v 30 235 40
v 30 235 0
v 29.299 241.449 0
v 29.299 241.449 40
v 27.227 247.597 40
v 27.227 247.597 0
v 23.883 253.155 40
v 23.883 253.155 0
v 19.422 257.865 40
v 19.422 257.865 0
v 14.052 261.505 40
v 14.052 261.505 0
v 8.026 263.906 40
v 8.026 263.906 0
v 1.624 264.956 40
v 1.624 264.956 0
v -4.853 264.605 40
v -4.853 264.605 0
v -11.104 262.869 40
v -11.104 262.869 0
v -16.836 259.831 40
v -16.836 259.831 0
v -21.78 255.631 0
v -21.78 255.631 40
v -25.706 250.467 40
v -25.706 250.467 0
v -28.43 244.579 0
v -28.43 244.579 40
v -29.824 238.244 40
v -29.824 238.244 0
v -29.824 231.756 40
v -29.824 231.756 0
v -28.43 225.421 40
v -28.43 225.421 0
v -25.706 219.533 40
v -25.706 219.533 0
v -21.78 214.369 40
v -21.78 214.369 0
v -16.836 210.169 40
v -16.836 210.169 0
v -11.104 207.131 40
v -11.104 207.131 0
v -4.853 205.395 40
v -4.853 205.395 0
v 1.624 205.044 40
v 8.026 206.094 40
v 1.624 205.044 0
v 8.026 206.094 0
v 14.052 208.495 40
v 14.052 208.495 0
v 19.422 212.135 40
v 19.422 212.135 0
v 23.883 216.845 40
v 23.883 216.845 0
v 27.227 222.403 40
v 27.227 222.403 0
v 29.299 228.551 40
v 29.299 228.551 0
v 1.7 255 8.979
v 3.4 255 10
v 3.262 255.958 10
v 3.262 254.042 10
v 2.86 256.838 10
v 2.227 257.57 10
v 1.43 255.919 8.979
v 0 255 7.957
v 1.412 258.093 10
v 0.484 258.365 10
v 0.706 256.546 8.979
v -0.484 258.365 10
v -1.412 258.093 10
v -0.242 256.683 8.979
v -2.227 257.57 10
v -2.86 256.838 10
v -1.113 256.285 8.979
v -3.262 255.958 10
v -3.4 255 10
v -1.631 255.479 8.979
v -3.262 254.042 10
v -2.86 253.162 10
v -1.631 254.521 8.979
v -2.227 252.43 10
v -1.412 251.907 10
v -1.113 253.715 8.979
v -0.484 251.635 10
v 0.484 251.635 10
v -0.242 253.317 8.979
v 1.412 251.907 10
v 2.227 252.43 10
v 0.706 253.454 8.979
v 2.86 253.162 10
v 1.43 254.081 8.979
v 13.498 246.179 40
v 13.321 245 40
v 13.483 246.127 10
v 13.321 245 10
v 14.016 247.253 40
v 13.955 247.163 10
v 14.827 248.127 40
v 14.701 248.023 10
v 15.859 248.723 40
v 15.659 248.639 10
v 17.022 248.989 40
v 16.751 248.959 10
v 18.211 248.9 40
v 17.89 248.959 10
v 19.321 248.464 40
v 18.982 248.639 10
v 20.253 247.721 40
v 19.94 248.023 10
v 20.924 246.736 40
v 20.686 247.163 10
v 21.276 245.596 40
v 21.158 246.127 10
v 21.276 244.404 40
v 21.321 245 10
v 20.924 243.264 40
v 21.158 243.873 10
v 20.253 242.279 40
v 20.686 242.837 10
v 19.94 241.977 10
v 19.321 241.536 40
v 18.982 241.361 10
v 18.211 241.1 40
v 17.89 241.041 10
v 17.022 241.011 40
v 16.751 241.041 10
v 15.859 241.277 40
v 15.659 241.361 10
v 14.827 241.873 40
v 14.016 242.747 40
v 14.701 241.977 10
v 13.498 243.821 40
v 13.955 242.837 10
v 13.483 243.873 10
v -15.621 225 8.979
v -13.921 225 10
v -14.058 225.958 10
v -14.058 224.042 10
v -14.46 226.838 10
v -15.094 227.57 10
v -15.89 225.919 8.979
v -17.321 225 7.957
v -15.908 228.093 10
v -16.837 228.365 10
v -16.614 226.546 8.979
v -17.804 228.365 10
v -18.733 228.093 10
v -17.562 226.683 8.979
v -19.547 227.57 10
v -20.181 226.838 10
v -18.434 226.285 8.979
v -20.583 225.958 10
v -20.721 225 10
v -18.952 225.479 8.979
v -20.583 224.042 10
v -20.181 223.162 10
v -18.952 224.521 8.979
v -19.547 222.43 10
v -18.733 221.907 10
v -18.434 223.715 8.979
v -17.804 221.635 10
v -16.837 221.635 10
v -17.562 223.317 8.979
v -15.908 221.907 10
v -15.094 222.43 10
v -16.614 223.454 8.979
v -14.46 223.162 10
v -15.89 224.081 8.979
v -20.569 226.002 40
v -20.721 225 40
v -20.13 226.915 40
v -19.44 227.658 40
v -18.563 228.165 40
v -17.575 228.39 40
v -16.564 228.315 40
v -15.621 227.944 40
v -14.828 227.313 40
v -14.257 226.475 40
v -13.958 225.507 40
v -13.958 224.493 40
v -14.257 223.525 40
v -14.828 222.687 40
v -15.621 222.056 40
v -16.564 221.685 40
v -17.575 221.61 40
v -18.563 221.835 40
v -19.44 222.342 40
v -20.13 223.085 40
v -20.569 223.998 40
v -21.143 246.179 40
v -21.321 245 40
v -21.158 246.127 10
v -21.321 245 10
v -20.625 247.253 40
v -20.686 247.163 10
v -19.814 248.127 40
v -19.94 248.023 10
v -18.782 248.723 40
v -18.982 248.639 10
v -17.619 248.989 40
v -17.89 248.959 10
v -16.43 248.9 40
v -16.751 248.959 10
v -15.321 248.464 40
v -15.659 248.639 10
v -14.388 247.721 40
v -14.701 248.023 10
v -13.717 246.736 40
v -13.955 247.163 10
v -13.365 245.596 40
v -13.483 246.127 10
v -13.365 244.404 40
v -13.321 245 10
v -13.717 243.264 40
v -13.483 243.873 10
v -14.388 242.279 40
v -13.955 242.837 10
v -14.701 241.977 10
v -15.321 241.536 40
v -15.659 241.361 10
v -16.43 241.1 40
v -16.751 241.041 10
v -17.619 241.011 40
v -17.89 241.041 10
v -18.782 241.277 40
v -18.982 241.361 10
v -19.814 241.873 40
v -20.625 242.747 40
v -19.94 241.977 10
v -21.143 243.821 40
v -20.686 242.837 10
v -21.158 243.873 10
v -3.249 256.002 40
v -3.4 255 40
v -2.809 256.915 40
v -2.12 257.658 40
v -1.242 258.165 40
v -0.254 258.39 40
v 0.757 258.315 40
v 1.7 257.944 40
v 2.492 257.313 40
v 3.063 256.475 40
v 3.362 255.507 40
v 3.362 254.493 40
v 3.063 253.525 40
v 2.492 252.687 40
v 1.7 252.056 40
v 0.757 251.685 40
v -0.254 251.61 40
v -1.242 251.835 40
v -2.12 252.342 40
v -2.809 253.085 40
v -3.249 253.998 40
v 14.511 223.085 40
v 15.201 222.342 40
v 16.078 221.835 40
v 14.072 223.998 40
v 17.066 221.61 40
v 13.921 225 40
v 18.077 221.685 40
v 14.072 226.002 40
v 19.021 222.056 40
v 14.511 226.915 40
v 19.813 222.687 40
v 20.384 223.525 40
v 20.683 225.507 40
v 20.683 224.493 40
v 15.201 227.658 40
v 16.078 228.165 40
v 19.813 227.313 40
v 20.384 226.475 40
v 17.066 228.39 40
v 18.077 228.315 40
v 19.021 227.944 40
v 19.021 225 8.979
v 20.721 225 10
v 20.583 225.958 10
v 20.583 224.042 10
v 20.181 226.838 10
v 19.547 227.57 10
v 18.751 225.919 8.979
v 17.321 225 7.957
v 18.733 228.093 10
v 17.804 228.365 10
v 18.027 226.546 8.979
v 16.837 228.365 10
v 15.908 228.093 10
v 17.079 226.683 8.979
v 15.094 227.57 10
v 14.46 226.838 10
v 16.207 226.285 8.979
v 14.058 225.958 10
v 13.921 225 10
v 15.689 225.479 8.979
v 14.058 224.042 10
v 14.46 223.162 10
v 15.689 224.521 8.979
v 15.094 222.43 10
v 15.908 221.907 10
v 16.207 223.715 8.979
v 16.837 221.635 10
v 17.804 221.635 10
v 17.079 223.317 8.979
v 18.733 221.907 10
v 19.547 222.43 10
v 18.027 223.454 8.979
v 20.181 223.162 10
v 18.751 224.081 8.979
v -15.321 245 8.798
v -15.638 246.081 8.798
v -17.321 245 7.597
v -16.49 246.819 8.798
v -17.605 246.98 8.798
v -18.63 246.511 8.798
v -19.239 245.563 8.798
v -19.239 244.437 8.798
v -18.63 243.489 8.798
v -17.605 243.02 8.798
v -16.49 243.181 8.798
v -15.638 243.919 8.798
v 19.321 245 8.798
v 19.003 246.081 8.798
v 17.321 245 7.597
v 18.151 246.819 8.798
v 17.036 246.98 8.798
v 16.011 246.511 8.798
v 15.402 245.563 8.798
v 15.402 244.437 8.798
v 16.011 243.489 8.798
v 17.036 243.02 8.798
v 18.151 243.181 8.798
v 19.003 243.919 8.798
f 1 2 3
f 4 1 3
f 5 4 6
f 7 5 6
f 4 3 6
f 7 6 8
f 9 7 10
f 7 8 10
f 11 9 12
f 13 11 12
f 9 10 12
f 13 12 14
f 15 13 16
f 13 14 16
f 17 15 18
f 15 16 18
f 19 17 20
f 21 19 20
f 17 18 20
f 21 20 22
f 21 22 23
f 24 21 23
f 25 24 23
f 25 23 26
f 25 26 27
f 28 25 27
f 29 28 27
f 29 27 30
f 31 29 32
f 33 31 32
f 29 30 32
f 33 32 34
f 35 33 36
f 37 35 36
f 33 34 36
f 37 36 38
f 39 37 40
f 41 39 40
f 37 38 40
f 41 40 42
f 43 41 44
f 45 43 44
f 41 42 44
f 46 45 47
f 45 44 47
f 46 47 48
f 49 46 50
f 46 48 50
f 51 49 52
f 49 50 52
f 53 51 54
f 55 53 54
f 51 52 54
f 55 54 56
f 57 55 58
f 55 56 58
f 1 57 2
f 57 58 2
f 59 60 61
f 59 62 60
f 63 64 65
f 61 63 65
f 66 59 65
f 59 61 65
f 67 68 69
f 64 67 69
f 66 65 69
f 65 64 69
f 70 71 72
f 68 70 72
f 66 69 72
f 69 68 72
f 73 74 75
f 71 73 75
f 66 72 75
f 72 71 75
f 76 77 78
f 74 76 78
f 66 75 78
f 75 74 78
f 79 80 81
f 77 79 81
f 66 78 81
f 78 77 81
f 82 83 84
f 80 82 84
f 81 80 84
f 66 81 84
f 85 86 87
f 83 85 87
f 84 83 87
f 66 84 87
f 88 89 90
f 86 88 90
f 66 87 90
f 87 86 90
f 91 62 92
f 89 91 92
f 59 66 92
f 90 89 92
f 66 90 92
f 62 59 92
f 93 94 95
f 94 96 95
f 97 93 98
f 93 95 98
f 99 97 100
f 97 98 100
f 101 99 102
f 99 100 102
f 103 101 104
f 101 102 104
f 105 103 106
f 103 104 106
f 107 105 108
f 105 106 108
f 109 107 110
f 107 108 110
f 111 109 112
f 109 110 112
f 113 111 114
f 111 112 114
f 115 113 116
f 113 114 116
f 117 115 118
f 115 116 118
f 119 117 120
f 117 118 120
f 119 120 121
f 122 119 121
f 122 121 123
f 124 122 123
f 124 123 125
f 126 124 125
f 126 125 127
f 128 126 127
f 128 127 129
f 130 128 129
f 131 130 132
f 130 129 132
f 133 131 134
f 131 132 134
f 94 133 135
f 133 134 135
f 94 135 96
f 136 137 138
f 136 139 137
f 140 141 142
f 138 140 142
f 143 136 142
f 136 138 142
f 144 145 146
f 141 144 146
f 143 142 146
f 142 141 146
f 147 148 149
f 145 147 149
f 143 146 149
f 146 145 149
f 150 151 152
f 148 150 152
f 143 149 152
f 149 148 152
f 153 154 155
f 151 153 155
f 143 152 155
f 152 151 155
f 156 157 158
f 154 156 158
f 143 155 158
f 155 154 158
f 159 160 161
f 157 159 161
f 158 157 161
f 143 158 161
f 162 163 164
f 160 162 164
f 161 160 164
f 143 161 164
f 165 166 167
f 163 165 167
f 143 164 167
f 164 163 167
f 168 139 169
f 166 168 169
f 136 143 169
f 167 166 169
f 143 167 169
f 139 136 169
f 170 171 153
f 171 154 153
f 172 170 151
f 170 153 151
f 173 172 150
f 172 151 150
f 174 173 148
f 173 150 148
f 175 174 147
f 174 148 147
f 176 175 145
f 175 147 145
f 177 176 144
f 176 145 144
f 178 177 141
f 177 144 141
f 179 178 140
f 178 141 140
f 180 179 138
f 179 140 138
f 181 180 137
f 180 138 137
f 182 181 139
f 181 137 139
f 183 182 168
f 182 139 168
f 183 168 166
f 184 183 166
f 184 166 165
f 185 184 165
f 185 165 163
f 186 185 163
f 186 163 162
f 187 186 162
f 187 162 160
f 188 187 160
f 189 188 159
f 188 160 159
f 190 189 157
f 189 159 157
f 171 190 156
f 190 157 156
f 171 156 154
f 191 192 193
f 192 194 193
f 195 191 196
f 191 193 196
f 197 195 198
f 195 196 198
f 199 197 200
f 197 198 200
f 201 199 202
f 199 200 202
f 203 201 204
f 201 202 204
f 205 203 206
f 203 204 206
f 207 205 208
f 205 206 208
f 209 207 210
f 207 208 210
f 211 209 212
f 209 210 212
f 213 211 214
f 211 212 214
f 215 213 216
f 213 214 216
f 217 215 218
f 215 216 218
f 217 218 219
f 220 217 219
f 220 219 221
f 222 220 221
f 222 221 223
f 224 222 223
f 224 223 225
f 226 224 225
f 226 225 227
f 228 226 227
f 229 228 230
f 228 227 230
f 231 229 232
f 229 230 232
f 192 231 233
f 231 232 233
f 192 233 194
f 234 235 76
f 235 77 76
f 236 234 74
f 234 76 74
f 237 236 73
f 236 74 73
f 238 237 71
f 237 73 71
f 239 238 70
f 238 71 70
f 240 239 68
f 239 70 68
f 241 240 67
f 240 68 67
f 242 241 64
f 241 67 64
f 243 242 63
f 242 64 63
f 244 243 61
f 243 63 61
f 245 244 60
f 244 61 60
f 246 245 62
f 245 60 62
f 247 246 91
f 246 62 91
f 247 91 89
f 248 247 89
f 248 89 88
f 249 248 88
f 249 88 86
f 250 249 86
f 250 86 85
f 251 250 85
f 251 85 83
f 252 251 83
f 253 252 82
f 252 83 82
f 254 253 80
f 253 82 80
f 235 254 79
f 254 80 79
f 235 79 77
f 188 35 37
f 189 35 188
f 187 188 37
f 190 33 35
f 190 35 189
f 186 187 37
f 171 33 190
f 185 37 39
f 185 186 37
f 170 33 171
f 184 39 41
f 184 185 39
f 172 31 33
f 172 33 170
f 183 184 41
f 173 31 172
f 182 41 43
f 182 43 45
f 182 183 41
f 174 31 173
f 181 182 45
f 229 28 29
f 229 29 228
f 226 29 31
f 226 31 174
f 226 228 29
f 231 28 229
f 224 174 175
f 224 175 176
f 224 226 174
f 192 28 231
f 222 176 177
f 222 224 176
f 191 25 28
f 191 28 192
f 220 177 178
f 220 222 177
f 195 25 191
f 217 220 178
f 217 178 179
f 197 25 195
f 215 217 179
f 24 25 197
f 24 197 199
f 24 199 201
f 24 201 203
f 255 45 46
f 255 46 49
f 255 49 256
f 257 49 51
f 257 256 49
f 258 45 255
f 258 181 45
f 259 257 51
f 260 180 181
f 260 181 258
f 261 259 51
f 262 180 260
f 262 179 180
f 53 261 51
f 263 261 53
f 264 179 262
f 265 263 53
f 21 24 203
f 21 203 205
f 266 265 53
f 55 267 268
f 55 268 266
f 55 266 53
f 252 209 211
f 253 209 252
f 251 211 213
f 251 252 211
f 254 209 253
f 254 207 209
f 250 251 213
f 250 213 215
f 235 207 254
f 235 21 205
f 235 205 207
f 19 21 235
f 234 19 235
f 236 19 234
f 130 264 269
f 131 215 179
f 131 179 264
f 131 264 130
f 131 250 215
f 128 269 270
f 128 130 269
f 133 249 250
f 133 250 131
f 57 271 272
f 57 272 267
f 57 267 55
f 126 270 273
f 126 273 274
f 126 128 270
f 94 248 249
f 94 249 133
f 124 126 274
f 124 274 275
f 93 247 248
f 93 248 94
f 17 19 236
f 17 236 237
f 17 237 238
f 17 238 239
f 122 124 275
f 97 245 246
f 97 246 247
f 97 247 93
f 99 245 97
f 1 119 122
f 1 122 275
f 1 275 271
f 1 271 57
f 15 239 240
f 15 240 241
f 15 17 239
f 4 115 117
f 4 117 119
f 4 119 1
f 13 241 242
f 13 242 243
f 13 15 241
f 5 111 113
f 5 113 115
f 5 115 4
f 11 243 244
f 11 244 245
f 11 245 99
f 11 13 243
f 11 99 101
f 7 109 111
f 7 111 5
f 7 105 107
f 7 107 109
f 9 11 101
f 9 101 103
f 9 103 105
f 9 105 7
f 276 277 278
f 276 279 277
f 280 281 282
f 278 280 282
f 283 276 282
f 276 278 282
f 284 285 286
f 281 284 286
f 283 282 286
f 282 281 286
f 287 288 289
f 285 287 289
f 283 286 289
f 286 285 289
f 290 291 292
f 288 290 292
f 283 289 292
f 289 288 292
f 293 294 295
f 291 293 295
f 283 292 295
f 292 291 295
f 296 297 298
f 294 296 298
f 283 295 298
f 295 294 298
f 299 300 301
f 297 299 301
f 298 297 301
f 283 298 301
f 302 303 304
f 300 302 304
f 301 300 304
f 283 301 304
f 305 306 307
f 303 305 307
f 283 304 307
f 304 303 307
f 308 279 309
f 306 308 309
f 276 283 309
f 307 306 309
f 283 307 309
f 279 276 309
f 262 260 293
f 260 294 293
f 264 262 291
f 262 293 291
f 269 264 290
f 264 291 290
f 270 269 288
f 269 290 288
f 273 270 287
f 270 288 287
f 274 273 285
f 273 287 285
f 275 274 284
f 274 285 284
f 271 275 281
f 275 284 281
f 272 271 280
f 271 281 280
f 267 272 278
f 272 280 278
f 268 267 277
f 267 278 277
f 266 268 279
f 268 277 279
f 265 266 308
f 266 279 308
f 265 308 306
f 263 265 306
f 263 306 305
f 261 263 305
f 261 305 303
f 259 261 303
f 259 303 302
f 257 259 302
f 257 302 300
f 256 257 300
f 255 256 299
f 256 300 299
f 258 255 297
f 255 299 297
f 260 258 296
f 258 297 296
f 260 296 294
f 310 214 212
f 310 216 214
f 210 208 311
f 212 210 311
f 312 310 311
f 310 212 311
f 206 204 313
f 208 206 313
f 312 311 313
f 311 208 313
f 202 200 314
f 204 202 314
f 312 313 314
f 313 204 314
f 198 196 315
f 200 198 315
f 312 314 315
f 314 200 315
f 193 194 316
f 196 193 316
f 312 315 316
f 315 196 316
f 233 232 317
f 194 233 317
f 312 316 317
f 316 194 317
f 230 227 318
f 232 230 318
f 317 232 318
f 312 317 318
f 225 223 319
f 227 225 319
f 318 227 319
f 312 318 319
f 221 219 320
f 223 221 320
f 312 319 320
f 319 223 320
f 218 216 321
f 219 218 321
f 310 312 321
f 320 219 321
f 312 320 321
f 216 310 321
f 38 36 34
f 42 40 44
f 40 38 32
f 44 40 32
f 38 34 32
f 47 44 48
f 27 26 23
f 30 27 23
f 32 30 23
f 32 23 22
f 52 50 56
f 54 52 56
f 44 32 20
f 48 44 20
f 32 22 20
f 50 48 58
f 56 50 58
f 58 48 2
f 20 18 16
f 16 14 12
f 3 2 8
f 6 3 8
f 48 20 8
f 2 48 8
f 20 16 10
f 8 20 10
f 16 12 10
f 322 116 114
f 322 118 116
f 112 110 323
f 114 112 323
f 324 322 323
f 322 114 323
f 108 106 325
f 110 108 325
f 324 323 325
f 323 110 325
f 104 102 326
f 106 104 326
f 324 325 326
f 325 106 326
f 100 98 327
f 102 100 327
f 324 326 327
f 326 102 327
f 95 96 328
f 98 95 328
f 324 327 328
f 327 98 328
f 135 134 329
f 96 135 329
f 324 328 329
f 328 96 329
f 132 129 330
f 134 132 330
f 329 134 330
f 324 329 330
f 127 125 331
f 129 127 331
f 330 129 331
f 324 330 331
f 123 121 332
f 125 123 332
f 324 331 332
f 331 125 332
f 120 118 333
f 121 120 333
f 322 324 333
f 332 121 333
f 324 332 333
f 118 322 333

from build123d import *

# Parameters (mm, degrees)
ESBO_O1_R                   = 30
RESSALTO_EXTRUS_O1_DEPTH    = 40
FURO_ROSCADO_DE_M81_D       = 6.8
FURO_ROSCADO_DE_M81_DEPTH   = 30
FURO_ROSCADO_DE_M81_TIP     = 2.042926105
FUROS_GUIA_COM_8_0MM1_D     = 8
FUROS_GUIA_COM_8_0MM1_DEPTH = 30
FUROS_GUIA_COM_8_0MM1_TIP   = 2.403442476


with BuildPart() as part:
    # Esboço1 → Ressalto-extrusão1 (new body)
    with BuildSketch(Plane.XY):
        with Locations((0, 235)):
            Circle(ESBO_O1_R)
    extrude(amount=RESSALTO_EXTRUS_O1_DEPTH)

    # Furo roscado de M81
    with Locations(Plane.XY.offset(40)):
        with Locations((-17.320508076, 225), (0, 255), (17.320508076, 225)):
            Hole(FURO_ROSCADO_DE_M81_D / 2, depth=FURO_ROSCADO_DE_M81_DEPTH)
            with Locations((0, 0, -(FURO_ROSCADO_DE_M81_DEPTH + FURO_ROSCADO_DE_M81_TIP / 2))):  # 118° drill point
                Cone(0, FURO_ROSCADO_DE_M81_D / 2, FURO_ROSCADO_DE_M81_TIP, mode=Mode.SUBTRACT)

    # Furos-guia com Ø8.0mm1
    with Locations(Plane.XY.offset(40)):
        with Locations((17.320508076, 245), (-17.320508076, 245)):
            Hole(FUROS_GUIA_COM_8_0MM1_D / 2, depth=FUROS_GUIA_COM_8_0MM1_DEPTH)
            with Locations((0, 0, -(FUROS_GUIA_COM_8_0MM1_DEPTH + FUROS_GUIA_COM_8_0MM1_TIP / 2))):  # 118° drill point
                Cone(0, FUROS_GUIA_COM_8_0MM1_D / 2, FUROS_GUIA_COM_8_0MM1_TIP, mode=Mode.SUBTRACT)


solid = part.part
